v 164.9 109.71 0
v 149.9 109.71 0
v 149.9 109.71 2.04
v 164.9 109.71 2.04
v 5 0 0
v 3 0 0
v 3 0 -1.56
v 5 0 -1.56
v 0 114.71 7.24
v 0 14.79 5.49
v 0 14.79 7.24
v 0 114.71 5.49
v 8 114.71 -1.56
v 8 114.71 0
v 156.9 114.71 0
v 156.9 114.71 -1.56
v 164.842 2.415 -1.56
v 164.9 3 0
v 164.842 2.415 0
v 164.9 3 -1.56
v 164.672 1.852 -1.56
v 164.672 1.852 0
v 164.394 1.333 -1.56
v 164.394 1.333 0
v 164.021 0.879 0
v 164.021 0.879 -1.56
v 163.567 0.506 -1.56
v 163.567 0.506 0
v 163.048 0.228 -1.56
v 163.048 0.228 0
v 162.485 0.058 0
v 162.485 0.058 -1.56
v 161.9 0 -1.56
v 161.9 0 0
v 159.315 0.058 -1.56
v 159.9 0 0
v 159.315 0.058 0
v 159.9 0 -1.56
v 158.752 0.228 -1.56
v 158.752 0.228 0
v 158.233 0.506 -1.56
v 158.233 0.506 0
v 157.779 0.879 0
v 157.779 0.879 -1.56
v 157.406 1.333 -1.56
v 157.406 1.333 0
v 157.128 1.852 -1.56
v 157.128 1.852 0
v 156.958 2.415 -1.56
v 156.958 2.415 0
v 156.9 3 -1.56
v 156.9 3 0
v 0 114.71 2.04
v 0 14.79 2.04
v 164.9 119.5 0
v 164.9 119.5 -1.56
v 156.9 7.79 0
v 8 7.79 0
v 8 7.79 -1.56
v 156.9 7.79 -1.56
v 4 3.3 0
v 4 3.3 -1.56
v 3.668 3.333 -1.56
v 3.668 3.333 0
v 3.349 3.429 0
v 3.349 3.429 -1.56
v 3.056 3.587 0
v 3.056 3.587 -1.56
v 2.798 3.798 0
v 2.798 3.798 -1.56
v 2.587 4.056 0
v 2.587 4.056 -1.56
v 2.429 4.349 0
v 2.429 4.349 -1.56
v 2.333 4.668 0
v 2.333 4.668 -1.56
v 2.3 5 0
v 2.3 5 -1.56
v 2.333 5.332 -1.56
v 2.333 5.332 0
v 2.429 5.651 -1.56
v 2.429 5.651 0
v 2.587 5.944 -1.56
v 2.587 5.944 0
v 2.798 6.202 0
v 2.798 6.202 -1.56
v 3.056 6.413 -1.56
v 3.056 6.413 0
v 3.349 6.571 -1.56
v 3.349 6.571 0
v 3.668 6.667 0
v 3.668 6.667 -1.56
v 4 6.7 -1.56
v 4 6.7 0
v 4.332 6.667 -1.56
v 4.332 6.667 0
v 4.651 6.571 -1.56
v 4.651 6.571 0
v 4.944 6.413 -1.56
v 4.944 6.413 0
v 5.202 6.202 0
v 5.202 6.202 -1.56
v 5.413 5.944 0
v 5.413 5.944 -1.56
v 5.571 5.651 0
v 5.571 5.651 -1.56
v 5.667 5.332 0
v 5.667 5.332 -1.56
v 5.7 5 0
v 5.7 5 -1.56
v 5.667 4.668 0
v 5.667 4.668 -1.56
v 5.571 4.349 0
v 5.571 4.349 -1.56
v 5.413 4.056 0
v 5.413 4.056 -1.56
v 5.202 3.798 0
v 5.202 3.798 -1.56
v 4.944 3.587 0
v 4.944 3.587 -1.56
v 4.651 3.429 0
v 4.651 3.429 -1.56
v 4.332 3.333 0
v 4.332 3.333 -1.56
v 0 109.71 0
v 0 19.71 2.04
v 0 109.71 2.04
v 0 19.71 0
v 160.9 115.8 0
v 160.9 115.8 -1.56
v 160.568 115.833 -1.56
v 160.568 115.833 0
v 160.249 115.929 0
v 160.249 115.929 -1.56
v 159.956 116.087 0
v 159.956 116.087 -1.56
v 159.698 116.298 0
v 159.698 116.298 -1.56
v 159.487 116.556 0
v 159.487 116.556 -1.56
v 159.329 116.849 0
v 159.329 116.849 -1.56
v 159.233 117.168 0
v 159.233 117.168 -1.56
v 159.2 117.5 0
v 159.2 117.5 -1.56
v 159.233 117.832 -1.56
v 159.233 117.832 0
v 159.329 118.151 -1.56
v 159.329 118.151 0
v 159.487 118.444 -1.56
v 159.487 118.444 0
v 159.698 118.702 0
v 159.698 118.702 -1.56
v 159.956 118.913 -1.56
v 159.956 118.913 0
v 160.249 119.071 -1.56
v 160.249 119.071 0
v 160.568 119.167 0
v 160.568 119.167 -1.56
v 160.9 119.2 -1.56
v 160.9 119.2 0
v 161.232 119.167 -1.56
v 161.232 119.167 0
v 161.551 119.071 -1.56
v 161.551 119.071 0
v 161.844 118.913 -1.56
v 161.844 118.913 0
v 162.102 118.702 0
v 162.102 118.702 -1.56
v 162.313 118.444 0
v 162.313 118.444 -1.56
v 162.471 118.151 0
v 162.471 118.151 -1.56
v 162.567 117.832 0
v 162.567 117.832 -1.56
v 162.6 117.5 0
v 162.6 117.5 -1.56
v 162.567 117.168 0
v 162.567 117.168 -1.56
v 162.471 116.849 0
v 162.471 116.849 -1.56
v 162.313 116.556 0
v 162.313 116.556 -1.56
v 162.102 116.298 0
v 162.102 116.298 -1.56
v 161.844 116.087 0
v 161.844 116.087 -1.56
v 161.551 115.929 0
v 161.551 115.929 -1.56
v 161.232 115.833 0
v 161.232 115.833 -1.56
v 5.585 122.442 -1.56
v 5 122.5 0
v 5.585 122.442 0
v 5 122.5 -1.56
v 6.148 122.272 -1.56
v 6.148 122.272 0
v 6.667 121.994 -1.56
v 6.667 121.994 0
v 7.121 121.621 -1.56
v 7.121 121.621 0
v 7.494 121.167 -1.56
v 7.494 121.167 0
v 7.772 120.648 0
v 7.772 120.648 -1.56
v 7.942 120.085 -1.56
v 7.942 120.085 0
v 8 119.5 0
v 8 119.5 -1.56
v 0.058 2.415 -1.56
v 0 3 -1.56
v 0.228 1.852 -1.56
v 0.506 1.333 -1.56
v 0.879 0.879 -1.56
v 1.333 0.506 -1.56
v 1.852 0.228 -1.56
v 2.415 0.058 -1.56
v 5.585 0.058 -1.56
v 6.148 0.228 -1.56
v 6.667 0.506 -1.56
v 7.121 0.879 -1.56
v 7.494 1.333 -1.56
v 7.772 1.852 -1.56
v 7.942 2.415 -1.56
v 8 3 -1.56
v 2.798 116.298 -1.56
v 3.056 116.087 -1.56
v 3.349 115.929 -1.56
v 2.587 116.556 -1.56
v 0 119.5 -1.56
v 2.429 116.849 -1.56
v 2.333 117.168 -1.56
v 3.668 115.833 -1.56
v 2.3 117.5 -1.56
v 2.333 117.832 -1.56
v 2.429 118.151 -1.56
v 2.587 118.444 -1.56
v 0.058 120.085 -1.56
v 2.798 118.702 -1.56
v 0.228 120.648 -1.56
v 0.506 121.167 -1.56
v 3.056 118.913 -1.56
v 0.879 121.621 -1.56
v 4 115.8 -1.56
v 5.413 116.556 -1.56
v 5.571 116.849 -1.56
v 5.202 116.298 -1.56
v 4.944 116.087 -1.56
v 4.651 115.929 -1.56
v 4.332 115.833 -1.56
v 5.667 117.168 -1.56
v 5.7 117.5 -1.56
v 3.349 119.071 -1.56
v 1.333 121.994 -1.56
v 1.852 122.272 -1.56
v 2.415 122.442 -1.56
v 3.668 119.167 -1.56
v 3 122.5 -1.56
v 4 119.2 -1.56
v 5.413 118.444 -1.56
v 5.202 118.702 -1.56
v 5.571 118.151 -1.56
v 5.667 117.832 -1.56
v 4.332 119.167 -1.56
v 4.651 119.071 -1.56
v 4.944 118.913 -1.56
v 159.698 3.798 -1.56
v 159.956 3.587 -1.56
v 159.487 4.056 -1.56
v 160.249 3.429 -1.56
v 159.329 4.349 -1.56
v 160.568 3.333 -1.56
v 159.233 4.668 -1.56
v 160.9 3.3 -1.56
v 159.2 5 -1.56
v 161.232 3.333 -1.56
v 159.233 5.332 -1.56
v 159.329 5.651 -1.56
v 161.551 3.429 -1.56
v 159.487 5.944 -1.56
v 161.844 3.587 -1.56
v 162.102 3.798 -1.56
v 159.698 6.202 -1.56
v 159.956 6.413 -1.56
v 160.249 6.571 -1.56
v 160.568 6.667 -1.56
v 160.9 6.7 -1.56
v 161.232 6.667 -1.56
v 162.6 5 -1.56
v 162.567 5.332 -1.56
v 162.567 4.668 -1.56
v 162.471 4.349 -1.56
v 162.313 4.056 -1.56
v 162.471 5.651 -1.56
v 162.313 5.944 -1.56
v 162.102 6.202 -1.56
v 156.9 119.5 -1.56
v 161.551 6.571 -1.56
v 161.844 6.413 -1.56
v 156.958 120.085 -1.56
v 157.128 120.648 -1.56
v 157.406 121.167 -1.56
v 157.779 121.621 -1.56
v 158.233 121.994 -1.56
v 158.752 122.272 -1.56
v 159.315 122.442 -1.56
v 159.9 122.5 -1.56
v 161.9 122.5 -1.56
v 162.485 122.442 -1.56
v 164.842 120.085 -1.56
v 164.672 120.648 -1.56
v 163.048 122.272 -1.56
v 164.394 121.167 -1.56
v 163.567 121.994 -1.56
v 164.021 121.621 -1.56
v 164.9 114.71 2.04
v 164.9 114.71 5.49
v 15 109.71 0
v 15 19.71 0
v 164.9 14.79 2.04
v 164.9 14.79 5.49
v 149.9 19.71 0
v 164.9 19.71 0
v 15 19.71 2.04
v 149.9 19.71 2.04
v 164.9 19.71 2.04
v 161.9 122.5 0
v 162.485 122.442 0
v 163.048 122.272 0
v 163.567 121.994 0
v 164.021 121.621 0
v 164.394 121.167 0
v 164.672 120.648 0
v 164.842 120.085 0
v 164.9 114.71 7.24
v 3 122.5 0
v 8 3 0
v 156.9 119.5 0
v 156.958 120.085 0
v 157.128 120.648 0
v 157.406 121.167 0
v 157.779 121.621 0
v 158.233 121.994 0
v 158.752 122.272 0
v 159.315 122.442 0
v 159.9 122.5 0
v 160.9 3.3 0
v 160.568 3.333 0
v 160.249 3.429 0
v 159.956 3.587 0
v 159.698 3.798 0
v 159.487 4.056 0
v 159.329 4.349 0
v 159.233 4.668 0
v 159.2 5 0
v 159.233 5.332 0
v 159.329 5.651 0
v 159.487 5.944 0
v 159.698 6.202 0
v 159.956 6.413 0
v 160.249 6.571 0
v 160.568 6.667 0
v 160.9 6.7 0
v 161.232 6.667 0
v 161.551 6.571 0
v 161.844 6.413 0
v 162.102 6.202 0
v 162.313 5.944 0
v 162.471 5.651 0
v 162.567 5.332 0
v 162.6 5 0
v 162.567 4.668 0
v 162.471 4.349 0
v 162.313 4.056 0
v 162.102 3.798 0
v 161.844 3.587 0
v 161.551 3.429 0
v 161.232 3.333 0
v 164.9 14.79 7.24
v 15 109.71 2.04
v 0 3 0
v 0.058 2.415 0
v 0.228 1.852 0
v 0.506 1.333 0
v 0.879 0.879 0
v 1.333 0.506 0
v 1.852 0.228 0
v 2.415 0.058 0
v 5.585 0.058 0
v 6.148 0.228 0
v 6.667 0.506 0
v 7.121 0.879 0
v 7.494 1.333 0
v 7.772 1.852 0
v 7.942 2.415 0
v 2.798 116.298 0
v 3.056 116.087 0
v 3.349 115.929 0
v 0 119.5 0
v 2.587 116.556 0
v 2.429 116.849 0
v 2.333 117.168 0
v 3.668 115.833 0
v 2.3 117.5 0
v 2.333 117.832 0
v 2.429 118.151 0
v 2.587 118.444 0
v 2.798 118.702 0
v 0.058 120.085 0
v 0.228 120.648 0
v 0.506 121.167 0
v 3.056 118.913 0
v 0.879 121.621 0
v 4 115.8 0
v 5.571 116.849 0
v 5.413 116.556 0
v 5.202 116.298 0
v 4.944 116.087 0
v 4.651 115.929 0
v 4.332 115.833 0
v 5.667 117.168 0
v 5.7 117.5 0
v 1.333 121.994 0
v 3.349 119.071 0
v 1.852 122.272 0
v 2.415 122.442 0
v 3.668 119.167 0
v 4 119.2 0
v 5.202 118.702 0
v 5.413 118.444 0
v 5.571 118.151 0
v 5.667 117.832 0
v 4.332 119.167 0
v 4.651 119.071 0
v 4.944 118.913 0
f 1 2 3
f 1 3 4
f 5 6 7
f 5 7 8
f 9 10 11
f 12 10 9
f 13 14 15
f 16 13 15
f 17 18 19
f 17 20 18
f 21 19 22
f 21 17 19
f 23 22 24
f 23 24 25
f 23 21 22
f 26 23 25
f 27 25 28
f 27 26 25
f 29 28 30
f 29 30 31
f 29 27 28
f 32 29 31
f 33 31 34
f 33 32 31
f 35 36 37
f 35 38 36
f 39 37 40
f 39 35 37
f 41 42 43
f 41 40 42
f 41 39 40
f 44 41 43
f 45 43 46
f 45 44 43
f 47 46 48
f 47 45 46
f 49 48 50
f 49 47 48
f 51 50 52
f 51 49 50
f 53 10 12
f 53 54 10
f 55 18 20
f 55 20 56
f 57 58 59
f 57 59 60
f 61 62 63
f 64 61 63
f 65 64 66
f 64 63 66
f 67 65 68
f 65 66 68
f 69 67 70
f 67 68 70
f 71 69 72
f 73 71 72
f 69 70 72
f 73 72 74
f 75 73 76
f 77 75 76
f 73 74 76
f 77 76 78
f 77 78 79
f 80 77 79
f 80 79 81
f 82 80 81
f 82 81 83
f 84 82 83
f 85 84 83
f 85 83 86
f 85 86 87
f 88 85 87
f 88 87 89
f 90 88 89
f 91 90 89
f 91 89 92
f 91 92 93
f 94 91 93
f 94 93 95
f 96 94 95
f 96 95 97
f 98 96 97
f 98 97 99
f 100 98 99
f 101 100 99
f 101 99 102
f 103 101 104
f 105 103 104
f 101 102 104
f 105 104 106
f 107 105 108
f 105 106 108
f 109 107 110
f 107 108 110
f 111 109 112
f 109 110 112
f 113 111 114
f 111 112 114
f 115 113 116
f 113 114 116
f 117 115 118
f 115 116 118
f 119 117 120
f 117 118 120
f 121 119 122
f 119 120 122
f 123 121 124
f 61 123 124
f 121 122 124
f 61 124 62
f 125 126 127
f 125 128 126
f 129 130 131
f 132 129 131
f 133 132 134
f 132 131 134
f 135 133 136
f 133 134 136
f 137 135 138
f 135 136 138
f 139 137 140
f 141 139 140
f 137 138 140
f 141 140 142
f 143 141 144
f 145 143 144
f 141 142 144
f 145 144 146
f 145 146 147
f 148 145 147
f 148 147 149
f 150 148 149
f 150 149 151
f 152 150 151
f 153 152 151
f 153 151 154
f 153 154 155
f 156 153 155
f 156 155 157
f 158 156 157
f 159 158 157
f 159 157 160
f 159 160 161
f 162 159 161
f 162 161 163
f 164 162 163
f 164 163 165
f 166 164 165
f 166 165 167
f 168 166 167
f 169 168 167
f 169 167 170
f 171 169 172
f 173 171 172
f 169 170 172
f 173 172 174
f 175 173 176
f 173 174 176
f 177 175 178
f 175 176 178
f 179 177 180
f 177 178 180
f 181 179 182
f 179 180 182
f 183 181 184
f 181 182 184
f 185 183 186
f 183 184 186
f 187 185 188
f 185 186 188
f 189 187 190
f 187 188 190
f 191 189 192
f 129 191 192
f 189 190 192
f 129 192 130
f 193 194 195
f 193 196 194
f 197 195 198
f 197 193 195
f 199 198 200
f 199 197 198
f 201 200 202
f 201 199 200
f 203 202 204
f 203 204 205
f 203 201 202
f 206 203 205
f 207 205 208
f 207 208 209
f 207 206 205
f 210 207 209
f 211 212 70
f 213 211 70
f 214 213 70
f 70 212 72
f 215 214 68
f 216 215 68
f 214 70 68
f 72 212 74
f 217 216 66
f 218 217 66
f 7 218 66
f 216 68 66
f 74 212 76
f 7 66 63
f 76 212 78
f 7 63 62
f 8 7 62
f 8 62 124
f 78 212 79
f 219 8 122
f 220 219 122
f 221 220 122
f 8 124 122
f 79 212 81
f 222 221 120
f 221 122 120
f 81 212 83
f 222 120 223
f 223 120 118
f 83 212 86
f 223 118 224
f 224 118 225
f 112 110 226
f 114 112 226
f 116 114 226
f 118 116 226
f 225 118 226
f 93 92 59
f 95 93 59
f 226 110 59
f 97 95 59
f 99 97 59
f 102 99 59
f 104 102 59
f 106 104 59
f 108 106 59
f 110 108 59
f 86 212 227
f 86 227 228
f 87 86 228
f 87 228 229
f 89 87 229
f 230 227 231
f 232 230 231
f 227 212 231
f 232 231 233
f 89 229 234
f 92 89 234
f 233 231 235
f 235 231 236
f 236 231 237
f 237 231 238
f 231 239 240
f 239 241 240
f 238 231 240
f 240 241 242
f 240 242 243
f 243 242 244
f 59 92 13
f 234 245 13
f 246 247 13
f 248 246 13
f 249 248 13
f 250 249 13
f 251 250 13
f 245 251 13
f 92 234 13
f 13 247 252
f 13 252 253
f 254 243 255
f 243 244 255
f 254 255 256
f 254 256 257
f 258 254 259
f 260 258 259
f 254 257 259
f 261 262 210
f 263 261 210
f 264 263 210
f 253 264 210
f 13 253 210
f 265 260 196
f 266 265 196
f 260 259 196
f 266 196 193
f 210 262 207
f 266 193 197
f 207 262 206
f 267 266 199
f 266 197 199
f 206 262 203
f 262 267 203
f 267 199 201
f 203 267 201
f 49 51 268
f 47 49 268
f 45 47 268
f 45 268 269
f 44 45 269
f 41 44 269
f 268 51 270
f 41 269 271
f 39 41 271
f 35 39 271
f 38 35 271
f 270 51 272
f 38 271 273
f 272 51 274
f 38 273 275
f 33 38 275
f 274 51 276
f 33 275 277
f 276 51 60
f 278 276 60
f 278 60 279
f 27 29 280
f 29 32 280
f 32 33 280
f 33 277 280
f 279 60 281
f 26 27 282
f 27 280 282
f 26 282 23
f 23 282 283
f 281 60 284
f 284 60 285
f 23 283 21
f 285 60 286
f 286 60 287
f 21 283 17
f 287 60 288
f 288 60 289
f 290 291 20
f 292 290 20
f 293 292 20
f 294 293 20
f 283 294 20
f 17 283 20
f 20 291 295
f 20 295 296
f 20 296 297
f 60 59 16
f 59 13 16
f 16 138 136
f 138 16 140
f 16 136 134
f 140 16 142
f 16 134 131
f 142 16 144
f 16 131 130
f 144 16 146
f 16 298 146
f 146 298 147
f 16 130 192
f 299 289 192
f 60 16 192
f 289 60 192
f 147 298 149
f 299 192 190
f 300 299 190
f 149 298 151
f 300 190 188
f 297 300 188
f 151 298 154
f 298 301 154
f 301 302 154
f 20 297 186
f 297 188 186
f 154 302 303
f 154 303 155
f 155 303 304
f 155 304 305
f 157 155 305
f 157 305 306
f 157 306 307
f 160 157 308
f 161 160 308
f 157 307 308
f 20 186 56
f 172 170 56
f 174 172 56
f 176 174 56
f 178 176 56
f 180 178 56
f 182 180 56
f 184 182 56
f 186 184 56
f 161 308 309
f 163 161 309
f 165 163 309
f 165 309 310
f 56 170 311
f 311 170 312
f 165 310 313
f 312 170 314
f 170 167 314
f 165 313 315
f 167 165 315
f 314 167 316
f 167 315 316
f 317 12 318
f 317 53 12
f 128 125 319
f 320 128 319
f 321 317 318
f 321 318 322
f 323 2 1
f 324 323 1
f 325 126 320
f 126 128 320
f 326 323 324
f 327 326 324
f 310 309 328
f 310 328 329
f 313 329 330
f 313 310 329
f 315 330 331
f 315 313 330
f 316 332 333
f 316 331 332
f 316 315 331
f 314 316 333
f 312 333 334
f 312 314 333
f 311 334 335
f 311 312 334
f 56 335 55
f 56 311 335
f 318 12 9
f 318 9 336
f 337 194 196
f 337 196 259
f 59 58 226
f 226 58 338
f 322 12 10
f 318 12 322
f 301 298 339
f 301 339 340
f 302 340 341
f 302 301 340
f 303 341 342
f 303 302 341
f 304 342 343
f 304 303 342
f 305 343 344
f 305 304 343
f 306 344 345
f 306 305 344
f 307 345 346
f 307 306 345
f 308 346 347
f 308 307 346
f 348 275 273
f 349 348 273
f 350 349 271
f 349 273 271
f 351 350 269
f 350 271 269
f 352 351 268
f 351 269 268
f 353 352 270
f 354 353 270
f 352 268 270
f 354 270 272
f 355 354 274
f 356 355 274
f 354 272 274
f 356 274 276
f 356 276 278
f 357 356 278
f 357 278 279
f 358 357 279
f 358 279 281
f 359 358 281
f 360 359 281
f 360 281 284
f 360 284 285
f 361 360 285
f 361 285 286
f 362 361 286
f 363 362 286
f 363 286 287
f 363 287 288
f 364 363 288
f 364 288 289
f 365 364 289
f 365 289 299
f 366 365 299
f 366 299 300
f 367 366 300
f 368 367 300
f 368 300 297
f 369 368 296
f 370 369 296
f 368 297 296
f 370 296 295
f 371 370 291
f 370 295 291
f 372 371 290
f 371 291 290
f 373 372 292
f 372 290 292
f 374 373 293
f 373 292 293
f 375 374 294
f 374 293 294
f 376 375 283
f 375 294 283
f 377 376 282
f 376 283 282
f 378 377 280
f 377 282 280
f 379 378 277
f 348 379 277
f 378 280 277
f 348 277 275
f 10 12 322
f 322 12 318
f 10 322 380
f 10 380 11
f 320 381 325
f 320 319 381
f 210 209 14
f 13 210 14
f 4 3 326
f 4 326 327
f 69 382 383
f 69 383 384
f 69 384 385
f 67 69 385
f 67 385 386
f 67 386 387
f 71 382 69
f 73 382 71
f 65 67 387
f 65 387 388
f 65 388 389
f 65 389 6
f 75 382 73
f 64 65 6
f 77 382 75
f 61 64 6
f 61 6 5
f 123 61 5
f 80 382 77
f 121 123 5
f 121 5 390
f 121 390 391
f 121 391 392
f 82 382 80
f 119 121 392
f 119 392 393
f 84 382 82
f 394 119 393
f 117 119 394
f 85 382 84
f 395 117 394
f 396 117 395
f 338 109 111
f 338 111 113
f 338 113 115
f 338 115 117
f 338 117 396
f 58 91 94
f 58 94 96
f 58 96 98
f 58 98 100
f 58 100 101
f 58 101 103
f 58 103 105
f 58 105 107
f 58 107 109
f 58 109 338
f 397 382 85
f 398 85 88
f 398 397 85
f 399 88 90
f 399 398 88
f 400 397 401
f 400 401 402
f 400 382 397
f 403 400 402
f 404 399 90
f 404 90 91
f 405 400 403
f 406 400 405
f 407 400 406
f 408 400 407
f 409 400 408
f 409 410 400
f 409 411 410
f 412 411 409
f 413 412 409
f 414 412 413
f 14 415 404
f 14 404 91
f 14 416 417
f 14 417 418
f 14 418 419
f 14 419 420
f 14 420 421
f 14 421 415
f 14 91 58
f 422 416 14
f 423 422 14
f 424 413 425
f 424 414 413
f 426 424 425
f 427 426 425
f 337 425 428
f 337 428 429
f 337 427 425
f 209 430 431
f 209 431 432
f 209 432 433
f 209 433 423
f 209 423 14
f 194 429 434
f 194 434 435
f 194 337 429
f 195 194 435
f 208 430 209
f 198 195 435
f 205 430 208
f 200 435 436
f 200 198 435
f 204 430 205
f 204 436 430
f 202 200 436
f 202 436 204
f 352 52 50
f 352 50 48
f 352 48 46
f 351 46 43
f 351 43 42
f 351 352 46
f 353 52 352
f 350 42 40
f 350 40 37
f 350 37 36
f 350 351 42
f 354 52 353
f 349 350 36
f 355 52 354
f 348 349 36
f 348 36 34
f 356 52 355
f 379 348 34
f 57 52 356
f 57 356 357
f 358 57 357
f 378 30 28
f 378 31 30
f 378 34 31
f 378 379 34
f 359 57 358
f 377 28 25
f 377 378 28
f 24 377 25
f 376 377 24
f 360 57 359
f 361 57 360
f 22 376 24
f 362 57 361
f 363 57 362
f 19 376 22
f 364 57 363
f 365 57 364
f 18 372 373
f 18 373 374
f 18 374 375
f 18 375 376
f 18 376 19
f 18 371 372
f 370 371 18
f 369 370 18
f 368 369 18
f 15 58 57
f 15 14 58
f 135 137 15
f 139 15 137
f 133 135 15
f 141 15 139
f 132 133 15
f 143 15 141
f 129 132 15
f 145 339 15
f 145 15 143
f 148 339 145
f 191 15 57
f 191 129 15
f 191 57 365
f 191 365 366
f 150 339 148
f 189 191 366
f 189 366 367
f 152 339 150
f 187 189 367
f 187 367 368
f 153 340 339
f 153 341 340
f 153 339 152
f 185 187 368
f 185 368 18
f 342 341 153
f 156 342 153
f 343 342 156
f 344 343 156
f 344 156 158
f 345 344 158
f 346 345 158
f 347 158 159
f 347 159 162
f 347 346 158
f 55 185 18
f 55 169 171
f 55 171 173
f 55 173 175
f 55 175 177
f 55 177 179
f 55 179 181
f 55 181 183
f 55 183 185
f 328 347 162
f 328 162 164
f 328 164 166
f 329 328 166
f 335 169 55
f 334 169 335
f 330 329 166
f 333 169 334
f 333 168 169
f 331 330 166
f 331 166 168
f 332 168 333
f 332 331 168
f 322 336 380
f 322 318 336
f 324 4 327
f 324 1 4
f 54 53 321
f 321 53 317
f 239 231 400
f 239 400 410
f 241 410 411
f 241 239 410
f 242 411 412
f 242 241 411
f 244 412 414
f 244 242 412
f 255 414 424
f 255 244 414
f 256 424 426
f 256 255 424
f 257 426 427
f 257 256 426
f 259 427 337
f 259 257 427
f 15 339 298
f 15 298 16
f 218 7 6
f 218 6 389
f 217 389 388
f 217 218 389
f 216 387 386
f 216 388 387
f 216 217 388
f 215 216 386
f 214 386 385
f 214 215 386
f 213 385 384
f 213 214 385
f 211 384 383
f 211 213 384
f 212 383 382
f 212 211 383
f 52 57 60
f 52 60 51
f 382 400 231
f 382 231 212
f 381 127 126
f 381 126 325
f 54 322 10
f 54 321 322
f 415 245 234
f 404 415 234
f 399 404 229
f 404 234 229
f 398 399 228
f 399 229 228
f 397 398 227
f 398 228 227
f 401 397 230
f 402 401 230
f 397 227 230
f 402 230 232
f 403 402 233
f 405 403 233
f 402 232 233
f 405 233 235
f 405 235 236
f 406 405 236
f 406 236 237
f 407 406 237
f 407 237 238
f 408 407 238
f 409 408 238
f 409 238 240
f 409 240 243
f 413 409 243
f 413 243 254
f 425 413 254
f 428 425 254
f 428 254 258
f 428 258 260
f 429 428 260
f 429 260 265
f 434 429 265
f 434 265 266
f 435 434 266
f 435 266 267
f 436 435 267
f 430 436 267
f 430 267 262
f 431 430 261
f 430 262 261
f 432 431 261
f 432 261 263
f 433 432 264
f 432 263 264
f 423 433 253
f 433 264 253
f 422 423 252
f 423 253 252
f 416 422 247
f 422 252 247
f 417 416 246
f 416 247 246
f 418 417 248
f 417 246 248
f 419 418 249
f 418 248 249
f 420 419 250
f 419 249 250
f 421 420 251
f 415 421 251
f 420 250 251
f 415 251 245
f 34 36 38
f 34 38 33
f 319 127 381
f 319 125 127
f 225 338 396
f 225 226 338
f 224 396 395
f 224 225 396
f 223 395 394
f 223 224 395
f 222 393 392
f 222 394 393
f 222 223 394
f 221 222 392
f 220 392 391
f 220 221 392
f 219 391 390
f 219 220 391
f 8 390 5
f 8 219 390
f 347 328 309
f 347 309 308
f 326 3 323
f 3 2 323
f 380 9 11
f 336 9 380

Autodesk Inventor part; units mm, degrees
ref_plane "YZ Plane" through (0, 0, 0) normal (1, 0, 0) x (0, 1, 0)
ref_plane "XZ Plane" through (0, 0, 0) normal (0, 1, 0) x (-1, 0, 0)
ref_plane "XY Plane" through (0, 0, 0) normal (0, 0, 1) x (1, 0, 0)
sketch "Sketch1" plane through (0, 0, 0) normal (0, 0, 1) x (1, 0, 0)
  line L0 (0, 0) -> (164.9, 0)
  line L1 (164.9, 0) -> (164.9, 122.5)
  line L2 (164.9, 122.5) -> (0, 122.5)
  line L3 (0, 122.5) -> (0, 0)
  line L4 (8, 122.5) -> (8, 0)
  line L5 (8, 114.71) -> (156.9, 114.71)
  line L6 (82.45, 122.5) -> (82.45, 0)
  line L7 (0, 61.25) -> (164.9, 61.25)
  line L8 (156.9, 122.5) -> (156.9, 0)
  line L9 (8, 7.79) -> (156.9, 7.79)
  line L10 (4, 117.5) -> (4, 5) construction
  line L11 (4, 117.5) -> (160.9, 117.5) construction
  line L12 (160.9, 117.5) -> (160.9, 5) construction
  line L13 (4, 5) -> (160.9, 5) construction
  circle A0 centre (4, 117.5) radius 1.75
  circle A1 centre (160.9, 117.5) radius 1.75
  circle A2 centre (160.9, 5) radius 1.75
  circle A3 centre (4, 5) radius 1.75
  point P0 (156.9, 0)
  point P1 (156.9, 122.5)
  point P2 (156.9, 115.59)
  dimension "d0" = 164.9
  dimension "d1" = 122.5
  dimension "d18" = 106.92
  dimension "d21" = 156.9
  dimension "d22" = 112.5
  dimension "d23" = 3.5
  dimension "d24" = 148.9
extrude "Extrusion1" add sketch "Sketch1" against normal blind 1.56 contours L3 L7 L4 L0 | L3 L2 L4 L7 | L4 L7 L6 L9 | L4 L5 L6 L7 | L8 L7 L1 L0 | L6 L7 L8 L9 | L6 L5 L8 L7 | L8 L2 L1 L7 | A0 | A1 | A2 | A3
fillet "Fillet1" radius 3 8 edges at (0, 122.5, -0.78) (8, 122.5, -0.78) (156.9, 122.5, -0.78) (164.9, 122.5, -0.78) (0, 0, -0.78) (8, 0, -0.78) (156.9, 0, -0.78) (164.9, 0, -0.78)
hole "Hole1" at (4, 117.5, 0) at (160.9, 117.5, 0) at (160.9, 5, 0) at (4, 5, 0) direction (0, 0, -1) diameter 3.4 end through all clearance for "Flat Head Machine Screw" size "M3" standard "Ansi Metric M Profile"
sketch "Sketch3" plane through (0, 0, 0) normal (0, 0, 1) x (1, 0, 0)
  line L0 (0, 114.71) -> (164.9, 114.71)
  line L1 (164.9, 114.71) -> (164.9, 14.79)
  line L2 (164.9, 14.79) -> (0, 14.79)
  line L3 (0, 14.79) -> (0, 114.71)
  line L4 (0, 119.5) -> (0, 3) construction
  line L5 (164.9, 3) -> (164.9, 119.5) projected
  line L6 (156.9, 114.71) -> (8, 114.71) construction
  line L7 (15, 114.71) -> (15, 14.79)
  line L8 (82.45, 114.71) -> (82.45, 14.79)
  line L9 (149.9, 114.71) -> (149.9, 14.79)
  line L10 (0, 109.71) -> (164.9, 109.71)
  line L11 (164.9, 61.25) -> (0, 61.25)
  line L12 (0, 19.71) -> (164.9, 19.71)
  line L13 (8, 7.79) -> (156.9, 7.79) projected
  point P0 (156.9, 115.59)
  point P1 (8, 114.71)
  point P2 (149.9, 114.71)
  point P3 (149.9, 14.79)
  point P4 (15, 109.71)
  point P5 (0, 109.71)
  point P6 (0, 19.71)
  point P7 (15, 19.71)
  point P8 (149.9, 109.71)
  point P9 (149.9, 19.71)
  point P10 (164.9, 19.71)
  dimension "d38" = 15
  dimension "d43" = 5
  dimension "d44" = 90
  dimension "d45" = 7
extrude "Extrusion2" add sketch "Sketch3" along normal blind 2.04 separate body contours L10 L7 L11 L3 | L11 L7 L12 L3 | L10 L1 L11 L9 | L11 L1 L12 L9
extrude "Extrusion3" add sketch "Sketch3" along normal blind 3.45 from surface at 2.04 separate body
extrude "Extrusion4" add sketch "Sketch3" along normal blind 1.75 from surface at 5.49 separate body
properties part number "7in Touch Display"
